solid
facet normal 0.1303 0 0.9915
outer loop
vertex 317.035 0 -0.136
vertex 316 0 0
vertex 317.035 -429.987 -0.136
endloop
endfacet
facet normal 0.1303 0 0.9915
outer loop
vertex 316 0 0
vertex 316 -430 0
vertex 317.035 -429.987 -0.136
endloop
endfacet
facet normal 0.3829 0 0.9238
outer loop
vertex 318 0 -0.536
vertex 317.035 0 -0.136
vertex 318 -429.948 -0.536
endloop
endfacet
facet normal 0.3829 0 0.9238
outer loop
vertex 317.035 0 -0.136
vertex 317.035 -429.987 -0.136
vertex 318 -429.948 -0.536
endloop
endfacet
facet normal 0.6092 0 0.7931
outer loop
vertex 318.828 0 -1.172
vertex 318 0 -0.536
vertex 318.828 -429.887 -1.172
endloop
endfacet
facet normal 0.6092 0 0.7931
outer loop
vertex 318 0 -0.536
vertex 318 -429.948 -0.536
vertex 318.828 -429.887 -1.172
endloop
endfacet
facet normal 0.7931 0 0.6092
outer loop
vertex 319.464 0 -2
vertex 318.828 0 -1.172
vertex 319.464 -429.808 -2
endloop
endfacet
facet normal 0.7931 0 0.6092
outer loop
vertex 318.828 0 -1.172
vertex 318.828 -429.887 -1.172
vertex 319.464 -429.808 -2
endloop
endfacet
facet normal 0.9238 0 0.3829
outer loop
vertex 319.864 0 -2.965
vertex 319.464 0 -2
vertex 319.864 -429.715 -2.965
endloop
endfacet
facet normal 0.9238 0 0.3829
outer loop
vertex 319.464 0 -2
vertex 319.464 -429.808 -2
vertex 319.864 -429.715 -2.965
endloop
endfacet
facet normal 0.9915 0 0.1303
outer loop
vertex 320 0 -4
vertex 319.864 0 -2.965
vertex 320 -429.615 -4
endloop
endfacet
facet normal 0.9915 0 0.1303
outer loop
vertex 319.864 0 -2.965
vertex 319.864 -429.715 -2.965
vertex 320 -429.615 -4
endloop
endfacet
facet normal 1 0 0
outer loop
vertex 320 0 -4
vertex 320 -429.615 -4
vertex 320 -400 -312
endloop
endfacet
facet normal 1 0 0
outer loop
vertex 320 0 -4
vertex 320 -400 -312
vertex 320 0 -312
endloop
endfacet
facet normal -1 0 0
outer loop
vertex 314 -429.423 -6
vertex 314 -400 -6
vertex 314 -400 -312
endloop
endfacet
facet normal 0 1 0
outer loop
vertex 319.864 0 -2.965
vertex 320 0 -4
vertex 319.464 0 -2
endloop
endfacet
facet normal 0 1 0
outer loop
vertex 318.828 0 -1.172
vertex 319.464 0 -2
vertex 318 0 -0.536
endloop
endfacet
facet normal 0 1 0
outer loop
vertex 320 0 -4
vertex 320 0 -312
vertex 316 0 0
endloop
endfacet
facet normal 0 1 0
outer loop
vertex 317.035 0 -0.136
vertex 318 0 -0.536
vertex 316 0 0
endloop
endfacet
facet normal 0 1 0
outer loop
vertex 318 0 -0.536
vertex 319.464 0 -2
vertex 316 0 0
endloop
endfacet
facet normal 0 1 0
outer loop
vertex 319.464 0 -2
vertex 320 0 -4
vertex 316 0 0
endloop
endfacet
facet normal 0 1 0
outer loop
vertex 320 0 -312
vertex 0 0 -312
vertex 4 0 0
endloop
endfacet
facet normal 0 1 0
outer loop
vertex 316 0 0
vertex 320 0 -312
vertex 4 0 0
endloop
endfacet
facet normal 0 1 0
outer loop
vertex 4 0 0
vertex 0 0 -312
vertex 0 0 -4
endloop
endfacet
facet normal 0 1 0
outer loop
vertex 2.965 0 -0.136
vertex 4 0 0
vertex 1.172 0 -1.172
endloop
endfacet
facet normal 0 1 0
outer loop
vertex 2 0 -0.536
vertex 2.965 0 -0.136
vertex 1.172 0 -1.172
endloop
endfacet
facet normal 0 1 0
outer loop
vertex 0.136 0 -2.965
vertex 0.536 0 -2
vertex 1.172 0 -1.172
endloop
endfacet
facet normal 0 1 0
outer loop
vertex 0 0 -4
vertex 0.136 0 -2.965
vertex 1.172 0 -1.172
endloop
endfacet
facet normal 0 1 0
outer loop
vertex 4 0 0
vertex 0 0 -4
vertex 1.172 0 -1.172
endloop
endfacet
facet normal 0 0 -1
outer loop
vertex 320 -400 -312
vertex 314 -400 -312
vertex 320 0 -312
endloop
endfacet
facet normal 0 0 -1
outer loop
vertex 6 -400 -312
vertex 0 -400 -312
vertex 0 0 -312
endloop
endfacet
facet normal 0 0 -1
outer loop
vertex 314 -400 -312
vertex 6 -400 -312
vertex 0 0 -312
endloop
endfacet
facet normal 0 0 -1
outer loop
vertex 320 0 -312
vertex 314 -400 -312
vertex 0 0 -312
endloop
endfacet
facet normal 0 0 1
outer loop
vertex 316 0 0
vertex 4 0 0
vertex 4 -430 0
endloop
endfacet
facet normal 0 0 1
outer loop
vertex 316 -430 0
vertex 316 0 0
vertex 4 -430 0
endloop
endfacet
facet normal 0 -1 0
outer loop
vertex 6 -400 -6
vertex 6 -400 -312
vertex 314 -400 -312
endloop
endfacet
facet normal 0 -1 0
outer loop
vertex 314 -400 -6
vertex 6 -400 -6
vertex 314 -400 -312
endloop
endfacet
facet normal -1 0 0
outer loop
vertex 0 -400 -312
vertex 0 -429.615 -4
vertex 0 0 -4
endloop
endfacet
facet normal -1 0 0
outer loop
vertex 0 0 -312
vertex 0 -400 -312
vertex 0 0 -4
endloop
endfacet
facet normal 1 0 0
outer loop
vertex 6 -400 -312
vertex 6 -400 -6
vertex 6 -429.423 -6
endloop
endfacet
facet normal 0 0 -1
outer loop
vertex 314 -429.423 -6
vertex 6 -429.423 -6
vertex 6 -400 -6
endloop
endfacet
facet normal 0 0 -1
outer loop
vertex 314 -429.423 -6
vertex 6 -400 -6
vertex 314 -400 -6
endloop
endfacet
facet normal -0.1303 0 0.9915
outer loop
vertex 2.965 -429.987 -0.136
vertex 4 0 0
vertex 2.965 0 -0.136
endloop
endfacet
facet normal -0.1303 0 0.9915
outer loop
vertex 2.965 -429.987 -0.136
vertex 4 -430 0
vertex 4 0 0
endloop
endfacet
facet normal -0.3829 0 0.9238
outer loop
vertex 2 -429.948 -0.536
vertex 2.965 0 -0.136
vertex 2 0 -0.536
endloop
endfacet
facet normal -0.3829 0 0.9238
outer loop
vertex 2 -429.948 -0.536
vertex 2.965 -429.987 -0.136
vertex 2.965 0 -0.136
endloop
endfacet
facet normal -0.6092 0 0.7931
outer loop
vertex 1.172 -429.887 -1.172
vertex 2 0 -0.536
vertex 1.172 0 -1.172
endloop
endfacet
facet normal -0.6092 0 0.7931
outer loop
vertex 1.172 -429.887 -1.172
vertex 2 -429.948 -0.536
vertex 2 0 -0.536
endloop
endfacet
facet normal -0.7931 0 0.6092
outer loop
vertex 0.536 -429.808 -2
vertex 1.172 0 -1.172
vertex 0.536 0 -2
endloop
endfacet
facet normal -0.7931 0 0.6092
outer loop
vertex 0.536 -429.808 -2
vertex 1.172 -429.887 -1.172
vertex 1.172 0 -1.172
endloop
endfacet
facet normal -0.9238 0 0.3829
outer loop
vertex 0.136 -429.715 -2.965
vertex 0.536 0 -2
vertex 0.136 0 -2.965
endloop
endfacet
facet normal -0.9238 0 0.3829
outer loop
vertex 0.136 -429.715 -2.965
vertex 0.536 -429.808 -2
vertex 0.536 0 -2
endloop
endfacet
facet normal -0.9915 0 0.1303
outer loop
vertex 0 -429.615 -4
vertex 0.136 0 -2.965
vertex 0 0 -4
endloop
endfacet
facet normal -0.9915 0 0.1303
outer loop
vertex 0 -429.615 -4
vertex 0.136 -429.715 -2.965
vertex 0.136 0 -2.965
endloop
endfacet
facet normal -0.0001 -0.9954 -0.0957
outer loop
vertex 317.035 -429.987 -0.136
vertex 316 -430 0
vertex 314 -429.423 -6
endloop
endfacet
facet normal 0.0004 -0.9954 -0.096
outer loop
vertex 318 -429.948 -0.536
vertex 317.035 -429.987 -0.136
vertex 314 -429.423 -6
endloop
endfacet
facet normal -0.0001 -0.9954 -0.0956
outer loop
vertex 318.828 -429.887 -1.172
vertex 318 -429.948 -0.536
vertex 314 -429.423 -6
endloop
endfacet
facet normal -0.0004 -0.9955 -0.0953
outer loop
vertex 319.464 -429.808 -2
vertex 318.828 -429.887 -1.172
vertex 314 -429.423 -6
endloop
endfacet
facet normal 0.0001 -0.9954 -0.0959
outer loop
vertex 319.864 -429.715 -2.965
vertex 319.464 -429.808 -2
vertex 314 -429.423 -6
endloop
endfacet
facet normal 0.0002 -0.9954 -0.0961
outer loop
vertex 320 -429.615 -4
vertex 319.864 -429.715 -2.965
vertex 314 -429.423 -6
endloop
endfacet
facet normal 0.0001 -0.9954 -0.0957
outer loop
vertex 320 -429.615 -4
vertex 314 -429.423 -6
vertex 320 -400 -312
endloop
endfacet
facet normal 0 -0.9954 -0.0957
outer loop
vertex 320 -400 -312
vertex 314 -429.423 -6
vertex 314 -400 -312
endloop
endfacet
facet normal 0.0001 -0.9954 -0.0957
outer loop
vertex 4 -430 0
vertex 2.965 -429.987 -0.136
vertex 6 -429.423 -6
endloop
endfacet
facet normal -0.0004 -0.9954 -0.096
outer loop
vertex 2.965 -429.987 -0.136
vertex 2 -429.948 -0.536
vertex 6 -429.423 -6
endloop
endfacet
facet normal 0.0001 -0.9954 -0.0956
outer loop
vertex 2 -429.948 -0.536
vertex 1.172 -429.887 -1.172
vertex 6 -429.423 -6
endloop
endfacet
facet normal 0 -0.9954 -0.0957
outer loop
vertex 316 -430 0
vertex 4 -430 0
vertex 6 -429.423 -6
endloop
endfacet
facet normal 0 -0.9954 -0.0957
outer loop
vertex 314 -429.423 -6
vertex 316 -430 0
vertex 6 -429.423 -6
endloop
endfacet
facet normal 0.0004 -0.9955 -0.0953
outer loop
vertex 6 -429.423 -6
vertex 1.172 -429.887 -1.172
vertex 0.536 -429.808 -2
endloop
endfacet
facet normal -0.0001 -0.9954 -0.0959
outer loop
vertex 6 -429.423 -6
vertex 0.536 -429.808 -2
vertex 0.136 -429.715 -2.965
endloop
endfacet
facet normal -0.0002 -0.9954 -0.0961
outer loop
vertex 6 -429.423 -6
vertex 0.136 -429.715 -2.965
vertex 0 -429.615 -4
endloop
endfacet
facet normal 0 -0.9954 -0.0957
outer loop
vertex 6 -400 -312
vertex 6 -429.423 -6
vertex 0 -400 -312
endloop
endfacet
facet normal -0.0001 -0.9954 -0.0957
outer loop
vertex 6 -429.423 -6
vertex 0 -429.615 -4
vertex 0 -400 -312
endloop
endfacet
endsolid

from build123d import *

# Parameters (mm, degrees)
F1_DEPTH = 320
F2_W     = 308
F2_H     = 30
F3_DEPTH = 306
F4_R     = 4


with BuildPart() as f1:
    # F0 (on Right) → F1 (new body)
    with BuildSketch(Plane.YZ):
        Polygon((0, -312), (0, 0), (-430, 0), (-400, -312), align=None)
    extrude(amount=F1_DEPTH)

    # F2 (on face) → F3 (cut, through all)
    with BuildSketch(Plane(origin=(0, 0, -312), x_dir=(1, 0, 0), z_dir=(0, 0, -1))):
        with Locations((160, 415)):
            Rectangle(F2_W, F2_H)
    extrude(amount=-F3_DEPTH, mode=Mode.SUBTRACT)

    # F4
    f4_edges = [f1.edges().sort_by_distance(p)[0] for p in [
        (0, -215, 0),
        (320, -215, 0),
    ]]
    fillet(f4_edges, radius=F4_R)


solid = f1.part
